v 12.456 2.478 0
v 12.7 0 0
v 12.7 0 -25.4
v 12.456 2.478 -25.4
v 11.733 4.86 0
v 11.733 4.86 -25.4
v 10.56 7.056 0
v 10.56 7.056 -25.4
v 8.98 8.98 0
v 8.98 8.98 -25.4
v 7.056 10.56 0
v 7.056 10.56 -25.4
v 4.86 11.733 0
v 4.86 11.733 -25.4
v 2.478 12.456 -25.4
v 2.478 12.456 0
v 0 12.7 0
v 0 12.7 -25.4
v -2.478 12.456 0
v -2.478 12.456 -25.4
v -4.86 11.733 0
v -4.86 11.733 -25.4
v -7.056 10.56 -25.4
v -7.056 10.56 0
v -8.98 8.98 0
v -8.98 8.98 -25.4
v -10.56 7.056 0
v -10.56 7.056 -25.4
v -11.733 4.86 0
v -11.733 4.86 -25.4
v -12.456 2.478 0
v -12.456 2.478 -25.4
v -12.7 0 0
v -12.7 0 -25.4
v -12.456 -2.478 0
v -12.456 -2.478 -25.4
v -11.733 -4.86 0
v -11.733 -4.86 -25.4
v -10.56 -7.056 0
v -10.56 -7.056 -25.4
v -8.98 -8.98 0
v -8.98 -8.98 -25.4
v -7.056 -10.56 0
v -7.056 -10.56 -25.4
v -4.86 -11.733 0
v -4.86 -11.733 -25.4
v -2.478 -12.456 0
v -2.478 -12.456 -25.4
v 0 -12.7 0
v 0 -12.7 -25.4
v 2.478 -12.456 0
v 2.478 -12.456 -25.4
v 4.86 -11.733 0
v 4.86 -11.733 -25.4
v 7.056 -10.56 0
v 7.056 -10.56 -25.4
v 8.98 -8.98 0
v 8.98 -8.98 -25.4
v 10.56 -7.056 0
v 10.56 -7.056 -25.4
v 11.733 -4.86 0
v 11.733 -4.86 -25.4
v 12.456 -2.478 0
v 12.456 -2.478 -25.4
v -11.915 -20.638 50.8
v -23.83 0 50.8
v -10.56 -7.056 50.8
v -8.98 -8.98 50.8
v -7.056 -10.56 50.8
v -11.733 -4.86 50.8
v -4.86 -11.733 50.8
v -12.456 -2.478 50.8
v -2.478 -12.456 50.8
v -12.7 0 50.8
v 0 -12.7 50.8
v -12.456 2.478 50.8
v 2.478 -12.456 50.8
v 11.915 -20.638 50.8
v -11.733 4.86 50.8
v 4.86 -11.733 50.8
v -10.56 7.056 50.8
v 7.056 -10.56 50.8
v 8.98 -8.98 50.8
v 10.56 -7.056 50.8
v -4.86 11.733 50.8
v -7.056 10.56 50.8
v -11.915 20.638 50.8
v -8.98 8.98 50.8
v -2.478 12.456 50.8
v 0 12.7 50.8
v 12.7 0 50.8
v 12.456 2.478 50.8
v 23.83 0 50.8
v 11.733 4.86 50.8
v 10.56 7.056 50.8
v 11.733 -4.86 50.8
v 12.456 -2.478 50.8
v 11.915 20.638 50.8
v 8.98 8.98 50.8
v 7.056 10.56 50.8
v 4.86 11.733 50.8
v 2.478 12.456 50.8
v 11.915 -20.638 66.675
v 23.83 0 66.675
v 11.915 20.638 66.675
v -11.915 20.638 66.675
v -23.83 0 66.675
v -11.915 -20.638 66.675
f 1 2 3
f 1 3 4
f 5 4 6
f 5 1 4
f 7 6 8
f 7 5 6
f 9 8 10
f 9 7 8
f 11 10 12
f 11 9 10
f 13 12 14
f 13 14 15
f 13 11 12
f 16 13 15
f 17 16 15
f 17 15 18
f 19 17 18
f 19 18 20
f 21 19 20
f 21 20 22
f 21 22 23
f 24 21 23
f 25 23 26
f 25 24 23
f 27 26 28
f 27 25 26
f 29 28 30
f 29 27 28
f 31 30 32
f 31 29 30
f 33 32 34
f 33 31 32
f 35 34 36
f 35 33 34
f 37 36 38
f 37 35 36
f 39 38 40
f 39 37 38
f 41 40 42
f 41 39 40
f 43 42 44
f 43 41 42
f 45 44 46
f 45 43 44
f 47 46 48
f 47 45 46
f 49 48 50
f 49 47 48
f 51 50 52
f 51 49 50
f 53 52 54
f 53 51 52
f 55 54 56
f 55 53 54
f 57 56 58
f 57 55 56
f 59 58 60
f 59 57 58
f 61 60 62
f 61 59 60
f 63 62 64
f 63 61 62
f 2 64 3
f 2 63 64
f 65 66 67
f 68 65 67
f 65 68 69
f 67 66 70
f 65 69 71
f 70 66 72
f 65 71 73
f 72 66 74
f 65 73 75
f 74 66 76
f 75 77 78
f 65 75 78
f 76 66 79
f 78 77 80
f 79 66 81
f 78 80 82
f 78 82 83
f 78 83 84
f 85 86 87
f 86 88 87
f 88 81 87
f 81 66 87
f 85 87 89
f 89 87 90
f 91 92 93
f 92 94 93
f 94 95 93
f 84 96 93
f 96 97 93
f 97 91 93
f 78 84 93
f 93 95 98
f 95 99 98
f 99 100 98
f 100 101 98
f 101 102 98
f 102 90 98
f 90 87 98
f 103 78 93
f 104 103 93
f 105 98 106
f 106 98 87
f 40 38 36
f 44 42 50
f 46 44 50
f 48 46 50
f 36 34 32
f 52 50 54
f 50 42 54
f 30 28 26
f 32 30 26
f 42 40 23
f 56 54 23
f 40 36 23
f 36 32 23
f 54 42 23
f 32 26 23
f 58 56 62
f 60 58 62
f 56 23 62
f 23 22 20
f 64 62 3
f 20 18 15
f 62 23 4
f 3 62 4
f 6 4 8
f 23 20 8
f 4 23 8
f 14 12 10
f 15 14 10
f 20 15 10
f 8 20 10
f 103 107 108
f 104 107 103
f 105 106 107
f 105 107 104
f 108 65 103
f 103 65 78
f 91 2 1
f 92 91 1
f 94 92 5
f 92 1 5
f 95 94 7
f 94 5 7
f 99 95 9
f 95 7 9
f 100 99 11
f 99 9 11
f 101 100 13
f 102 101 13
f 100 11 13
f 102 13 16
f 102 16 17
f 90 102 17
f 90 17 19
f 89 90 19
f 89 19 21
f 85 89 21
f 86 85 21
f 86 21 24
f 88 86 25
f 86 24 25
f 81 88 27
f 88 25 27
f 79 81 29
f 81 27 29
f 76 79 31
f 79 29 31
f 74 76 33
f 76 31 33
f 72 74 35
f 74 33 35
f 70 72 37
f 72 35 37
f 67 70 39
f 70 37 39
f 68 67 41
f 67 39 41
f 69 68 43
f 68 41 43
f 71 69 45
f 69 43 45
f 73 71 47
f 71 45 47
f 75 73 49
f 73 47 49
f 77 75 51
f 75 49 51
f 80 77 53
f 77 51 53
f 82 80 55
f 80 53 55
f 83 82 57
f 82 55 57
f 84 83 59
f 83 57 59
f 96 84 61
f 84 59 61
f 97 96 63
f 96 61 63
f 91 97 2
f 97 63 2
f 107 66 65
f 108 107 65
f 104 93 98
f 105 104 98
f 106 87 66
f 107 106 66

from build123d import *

# Parameters (mm, degrees)
F0_R          = 12.7
F1_DEPTH      = 25.4
F1_DEPTH_BACK = 50.8
F3_DEPTH      = 15.875


# Not quite as in the source:
# - a feature names something its author has since deleted; it is built from what else it names


with BuildPart() as f1:
    # F0 (on Top) → F1 (new body, two sides)
    with BuildSketch(Plane.XY) as f1_sk:
        Circle(F0_R)
    extrude(amount=-F1_DEPTH)
    extrude(f1_sk.sketch, amount=F1_DEPTH_BACK)

    # F2 (on face) → F3 (join)
    with BuildSketch(Plane.XY.offset(50.8)):
        Polygon((11.9150661804, 20.6375), (-11.9150661804, 20.6375), (-23.8301323608, 0), (-11.9150661804, -20.6375), (11.9150661804, -20.6375), (23.8301323608, 0), align=None)
    extrude(amount=F3_DEPTH)


solid = f1.part
